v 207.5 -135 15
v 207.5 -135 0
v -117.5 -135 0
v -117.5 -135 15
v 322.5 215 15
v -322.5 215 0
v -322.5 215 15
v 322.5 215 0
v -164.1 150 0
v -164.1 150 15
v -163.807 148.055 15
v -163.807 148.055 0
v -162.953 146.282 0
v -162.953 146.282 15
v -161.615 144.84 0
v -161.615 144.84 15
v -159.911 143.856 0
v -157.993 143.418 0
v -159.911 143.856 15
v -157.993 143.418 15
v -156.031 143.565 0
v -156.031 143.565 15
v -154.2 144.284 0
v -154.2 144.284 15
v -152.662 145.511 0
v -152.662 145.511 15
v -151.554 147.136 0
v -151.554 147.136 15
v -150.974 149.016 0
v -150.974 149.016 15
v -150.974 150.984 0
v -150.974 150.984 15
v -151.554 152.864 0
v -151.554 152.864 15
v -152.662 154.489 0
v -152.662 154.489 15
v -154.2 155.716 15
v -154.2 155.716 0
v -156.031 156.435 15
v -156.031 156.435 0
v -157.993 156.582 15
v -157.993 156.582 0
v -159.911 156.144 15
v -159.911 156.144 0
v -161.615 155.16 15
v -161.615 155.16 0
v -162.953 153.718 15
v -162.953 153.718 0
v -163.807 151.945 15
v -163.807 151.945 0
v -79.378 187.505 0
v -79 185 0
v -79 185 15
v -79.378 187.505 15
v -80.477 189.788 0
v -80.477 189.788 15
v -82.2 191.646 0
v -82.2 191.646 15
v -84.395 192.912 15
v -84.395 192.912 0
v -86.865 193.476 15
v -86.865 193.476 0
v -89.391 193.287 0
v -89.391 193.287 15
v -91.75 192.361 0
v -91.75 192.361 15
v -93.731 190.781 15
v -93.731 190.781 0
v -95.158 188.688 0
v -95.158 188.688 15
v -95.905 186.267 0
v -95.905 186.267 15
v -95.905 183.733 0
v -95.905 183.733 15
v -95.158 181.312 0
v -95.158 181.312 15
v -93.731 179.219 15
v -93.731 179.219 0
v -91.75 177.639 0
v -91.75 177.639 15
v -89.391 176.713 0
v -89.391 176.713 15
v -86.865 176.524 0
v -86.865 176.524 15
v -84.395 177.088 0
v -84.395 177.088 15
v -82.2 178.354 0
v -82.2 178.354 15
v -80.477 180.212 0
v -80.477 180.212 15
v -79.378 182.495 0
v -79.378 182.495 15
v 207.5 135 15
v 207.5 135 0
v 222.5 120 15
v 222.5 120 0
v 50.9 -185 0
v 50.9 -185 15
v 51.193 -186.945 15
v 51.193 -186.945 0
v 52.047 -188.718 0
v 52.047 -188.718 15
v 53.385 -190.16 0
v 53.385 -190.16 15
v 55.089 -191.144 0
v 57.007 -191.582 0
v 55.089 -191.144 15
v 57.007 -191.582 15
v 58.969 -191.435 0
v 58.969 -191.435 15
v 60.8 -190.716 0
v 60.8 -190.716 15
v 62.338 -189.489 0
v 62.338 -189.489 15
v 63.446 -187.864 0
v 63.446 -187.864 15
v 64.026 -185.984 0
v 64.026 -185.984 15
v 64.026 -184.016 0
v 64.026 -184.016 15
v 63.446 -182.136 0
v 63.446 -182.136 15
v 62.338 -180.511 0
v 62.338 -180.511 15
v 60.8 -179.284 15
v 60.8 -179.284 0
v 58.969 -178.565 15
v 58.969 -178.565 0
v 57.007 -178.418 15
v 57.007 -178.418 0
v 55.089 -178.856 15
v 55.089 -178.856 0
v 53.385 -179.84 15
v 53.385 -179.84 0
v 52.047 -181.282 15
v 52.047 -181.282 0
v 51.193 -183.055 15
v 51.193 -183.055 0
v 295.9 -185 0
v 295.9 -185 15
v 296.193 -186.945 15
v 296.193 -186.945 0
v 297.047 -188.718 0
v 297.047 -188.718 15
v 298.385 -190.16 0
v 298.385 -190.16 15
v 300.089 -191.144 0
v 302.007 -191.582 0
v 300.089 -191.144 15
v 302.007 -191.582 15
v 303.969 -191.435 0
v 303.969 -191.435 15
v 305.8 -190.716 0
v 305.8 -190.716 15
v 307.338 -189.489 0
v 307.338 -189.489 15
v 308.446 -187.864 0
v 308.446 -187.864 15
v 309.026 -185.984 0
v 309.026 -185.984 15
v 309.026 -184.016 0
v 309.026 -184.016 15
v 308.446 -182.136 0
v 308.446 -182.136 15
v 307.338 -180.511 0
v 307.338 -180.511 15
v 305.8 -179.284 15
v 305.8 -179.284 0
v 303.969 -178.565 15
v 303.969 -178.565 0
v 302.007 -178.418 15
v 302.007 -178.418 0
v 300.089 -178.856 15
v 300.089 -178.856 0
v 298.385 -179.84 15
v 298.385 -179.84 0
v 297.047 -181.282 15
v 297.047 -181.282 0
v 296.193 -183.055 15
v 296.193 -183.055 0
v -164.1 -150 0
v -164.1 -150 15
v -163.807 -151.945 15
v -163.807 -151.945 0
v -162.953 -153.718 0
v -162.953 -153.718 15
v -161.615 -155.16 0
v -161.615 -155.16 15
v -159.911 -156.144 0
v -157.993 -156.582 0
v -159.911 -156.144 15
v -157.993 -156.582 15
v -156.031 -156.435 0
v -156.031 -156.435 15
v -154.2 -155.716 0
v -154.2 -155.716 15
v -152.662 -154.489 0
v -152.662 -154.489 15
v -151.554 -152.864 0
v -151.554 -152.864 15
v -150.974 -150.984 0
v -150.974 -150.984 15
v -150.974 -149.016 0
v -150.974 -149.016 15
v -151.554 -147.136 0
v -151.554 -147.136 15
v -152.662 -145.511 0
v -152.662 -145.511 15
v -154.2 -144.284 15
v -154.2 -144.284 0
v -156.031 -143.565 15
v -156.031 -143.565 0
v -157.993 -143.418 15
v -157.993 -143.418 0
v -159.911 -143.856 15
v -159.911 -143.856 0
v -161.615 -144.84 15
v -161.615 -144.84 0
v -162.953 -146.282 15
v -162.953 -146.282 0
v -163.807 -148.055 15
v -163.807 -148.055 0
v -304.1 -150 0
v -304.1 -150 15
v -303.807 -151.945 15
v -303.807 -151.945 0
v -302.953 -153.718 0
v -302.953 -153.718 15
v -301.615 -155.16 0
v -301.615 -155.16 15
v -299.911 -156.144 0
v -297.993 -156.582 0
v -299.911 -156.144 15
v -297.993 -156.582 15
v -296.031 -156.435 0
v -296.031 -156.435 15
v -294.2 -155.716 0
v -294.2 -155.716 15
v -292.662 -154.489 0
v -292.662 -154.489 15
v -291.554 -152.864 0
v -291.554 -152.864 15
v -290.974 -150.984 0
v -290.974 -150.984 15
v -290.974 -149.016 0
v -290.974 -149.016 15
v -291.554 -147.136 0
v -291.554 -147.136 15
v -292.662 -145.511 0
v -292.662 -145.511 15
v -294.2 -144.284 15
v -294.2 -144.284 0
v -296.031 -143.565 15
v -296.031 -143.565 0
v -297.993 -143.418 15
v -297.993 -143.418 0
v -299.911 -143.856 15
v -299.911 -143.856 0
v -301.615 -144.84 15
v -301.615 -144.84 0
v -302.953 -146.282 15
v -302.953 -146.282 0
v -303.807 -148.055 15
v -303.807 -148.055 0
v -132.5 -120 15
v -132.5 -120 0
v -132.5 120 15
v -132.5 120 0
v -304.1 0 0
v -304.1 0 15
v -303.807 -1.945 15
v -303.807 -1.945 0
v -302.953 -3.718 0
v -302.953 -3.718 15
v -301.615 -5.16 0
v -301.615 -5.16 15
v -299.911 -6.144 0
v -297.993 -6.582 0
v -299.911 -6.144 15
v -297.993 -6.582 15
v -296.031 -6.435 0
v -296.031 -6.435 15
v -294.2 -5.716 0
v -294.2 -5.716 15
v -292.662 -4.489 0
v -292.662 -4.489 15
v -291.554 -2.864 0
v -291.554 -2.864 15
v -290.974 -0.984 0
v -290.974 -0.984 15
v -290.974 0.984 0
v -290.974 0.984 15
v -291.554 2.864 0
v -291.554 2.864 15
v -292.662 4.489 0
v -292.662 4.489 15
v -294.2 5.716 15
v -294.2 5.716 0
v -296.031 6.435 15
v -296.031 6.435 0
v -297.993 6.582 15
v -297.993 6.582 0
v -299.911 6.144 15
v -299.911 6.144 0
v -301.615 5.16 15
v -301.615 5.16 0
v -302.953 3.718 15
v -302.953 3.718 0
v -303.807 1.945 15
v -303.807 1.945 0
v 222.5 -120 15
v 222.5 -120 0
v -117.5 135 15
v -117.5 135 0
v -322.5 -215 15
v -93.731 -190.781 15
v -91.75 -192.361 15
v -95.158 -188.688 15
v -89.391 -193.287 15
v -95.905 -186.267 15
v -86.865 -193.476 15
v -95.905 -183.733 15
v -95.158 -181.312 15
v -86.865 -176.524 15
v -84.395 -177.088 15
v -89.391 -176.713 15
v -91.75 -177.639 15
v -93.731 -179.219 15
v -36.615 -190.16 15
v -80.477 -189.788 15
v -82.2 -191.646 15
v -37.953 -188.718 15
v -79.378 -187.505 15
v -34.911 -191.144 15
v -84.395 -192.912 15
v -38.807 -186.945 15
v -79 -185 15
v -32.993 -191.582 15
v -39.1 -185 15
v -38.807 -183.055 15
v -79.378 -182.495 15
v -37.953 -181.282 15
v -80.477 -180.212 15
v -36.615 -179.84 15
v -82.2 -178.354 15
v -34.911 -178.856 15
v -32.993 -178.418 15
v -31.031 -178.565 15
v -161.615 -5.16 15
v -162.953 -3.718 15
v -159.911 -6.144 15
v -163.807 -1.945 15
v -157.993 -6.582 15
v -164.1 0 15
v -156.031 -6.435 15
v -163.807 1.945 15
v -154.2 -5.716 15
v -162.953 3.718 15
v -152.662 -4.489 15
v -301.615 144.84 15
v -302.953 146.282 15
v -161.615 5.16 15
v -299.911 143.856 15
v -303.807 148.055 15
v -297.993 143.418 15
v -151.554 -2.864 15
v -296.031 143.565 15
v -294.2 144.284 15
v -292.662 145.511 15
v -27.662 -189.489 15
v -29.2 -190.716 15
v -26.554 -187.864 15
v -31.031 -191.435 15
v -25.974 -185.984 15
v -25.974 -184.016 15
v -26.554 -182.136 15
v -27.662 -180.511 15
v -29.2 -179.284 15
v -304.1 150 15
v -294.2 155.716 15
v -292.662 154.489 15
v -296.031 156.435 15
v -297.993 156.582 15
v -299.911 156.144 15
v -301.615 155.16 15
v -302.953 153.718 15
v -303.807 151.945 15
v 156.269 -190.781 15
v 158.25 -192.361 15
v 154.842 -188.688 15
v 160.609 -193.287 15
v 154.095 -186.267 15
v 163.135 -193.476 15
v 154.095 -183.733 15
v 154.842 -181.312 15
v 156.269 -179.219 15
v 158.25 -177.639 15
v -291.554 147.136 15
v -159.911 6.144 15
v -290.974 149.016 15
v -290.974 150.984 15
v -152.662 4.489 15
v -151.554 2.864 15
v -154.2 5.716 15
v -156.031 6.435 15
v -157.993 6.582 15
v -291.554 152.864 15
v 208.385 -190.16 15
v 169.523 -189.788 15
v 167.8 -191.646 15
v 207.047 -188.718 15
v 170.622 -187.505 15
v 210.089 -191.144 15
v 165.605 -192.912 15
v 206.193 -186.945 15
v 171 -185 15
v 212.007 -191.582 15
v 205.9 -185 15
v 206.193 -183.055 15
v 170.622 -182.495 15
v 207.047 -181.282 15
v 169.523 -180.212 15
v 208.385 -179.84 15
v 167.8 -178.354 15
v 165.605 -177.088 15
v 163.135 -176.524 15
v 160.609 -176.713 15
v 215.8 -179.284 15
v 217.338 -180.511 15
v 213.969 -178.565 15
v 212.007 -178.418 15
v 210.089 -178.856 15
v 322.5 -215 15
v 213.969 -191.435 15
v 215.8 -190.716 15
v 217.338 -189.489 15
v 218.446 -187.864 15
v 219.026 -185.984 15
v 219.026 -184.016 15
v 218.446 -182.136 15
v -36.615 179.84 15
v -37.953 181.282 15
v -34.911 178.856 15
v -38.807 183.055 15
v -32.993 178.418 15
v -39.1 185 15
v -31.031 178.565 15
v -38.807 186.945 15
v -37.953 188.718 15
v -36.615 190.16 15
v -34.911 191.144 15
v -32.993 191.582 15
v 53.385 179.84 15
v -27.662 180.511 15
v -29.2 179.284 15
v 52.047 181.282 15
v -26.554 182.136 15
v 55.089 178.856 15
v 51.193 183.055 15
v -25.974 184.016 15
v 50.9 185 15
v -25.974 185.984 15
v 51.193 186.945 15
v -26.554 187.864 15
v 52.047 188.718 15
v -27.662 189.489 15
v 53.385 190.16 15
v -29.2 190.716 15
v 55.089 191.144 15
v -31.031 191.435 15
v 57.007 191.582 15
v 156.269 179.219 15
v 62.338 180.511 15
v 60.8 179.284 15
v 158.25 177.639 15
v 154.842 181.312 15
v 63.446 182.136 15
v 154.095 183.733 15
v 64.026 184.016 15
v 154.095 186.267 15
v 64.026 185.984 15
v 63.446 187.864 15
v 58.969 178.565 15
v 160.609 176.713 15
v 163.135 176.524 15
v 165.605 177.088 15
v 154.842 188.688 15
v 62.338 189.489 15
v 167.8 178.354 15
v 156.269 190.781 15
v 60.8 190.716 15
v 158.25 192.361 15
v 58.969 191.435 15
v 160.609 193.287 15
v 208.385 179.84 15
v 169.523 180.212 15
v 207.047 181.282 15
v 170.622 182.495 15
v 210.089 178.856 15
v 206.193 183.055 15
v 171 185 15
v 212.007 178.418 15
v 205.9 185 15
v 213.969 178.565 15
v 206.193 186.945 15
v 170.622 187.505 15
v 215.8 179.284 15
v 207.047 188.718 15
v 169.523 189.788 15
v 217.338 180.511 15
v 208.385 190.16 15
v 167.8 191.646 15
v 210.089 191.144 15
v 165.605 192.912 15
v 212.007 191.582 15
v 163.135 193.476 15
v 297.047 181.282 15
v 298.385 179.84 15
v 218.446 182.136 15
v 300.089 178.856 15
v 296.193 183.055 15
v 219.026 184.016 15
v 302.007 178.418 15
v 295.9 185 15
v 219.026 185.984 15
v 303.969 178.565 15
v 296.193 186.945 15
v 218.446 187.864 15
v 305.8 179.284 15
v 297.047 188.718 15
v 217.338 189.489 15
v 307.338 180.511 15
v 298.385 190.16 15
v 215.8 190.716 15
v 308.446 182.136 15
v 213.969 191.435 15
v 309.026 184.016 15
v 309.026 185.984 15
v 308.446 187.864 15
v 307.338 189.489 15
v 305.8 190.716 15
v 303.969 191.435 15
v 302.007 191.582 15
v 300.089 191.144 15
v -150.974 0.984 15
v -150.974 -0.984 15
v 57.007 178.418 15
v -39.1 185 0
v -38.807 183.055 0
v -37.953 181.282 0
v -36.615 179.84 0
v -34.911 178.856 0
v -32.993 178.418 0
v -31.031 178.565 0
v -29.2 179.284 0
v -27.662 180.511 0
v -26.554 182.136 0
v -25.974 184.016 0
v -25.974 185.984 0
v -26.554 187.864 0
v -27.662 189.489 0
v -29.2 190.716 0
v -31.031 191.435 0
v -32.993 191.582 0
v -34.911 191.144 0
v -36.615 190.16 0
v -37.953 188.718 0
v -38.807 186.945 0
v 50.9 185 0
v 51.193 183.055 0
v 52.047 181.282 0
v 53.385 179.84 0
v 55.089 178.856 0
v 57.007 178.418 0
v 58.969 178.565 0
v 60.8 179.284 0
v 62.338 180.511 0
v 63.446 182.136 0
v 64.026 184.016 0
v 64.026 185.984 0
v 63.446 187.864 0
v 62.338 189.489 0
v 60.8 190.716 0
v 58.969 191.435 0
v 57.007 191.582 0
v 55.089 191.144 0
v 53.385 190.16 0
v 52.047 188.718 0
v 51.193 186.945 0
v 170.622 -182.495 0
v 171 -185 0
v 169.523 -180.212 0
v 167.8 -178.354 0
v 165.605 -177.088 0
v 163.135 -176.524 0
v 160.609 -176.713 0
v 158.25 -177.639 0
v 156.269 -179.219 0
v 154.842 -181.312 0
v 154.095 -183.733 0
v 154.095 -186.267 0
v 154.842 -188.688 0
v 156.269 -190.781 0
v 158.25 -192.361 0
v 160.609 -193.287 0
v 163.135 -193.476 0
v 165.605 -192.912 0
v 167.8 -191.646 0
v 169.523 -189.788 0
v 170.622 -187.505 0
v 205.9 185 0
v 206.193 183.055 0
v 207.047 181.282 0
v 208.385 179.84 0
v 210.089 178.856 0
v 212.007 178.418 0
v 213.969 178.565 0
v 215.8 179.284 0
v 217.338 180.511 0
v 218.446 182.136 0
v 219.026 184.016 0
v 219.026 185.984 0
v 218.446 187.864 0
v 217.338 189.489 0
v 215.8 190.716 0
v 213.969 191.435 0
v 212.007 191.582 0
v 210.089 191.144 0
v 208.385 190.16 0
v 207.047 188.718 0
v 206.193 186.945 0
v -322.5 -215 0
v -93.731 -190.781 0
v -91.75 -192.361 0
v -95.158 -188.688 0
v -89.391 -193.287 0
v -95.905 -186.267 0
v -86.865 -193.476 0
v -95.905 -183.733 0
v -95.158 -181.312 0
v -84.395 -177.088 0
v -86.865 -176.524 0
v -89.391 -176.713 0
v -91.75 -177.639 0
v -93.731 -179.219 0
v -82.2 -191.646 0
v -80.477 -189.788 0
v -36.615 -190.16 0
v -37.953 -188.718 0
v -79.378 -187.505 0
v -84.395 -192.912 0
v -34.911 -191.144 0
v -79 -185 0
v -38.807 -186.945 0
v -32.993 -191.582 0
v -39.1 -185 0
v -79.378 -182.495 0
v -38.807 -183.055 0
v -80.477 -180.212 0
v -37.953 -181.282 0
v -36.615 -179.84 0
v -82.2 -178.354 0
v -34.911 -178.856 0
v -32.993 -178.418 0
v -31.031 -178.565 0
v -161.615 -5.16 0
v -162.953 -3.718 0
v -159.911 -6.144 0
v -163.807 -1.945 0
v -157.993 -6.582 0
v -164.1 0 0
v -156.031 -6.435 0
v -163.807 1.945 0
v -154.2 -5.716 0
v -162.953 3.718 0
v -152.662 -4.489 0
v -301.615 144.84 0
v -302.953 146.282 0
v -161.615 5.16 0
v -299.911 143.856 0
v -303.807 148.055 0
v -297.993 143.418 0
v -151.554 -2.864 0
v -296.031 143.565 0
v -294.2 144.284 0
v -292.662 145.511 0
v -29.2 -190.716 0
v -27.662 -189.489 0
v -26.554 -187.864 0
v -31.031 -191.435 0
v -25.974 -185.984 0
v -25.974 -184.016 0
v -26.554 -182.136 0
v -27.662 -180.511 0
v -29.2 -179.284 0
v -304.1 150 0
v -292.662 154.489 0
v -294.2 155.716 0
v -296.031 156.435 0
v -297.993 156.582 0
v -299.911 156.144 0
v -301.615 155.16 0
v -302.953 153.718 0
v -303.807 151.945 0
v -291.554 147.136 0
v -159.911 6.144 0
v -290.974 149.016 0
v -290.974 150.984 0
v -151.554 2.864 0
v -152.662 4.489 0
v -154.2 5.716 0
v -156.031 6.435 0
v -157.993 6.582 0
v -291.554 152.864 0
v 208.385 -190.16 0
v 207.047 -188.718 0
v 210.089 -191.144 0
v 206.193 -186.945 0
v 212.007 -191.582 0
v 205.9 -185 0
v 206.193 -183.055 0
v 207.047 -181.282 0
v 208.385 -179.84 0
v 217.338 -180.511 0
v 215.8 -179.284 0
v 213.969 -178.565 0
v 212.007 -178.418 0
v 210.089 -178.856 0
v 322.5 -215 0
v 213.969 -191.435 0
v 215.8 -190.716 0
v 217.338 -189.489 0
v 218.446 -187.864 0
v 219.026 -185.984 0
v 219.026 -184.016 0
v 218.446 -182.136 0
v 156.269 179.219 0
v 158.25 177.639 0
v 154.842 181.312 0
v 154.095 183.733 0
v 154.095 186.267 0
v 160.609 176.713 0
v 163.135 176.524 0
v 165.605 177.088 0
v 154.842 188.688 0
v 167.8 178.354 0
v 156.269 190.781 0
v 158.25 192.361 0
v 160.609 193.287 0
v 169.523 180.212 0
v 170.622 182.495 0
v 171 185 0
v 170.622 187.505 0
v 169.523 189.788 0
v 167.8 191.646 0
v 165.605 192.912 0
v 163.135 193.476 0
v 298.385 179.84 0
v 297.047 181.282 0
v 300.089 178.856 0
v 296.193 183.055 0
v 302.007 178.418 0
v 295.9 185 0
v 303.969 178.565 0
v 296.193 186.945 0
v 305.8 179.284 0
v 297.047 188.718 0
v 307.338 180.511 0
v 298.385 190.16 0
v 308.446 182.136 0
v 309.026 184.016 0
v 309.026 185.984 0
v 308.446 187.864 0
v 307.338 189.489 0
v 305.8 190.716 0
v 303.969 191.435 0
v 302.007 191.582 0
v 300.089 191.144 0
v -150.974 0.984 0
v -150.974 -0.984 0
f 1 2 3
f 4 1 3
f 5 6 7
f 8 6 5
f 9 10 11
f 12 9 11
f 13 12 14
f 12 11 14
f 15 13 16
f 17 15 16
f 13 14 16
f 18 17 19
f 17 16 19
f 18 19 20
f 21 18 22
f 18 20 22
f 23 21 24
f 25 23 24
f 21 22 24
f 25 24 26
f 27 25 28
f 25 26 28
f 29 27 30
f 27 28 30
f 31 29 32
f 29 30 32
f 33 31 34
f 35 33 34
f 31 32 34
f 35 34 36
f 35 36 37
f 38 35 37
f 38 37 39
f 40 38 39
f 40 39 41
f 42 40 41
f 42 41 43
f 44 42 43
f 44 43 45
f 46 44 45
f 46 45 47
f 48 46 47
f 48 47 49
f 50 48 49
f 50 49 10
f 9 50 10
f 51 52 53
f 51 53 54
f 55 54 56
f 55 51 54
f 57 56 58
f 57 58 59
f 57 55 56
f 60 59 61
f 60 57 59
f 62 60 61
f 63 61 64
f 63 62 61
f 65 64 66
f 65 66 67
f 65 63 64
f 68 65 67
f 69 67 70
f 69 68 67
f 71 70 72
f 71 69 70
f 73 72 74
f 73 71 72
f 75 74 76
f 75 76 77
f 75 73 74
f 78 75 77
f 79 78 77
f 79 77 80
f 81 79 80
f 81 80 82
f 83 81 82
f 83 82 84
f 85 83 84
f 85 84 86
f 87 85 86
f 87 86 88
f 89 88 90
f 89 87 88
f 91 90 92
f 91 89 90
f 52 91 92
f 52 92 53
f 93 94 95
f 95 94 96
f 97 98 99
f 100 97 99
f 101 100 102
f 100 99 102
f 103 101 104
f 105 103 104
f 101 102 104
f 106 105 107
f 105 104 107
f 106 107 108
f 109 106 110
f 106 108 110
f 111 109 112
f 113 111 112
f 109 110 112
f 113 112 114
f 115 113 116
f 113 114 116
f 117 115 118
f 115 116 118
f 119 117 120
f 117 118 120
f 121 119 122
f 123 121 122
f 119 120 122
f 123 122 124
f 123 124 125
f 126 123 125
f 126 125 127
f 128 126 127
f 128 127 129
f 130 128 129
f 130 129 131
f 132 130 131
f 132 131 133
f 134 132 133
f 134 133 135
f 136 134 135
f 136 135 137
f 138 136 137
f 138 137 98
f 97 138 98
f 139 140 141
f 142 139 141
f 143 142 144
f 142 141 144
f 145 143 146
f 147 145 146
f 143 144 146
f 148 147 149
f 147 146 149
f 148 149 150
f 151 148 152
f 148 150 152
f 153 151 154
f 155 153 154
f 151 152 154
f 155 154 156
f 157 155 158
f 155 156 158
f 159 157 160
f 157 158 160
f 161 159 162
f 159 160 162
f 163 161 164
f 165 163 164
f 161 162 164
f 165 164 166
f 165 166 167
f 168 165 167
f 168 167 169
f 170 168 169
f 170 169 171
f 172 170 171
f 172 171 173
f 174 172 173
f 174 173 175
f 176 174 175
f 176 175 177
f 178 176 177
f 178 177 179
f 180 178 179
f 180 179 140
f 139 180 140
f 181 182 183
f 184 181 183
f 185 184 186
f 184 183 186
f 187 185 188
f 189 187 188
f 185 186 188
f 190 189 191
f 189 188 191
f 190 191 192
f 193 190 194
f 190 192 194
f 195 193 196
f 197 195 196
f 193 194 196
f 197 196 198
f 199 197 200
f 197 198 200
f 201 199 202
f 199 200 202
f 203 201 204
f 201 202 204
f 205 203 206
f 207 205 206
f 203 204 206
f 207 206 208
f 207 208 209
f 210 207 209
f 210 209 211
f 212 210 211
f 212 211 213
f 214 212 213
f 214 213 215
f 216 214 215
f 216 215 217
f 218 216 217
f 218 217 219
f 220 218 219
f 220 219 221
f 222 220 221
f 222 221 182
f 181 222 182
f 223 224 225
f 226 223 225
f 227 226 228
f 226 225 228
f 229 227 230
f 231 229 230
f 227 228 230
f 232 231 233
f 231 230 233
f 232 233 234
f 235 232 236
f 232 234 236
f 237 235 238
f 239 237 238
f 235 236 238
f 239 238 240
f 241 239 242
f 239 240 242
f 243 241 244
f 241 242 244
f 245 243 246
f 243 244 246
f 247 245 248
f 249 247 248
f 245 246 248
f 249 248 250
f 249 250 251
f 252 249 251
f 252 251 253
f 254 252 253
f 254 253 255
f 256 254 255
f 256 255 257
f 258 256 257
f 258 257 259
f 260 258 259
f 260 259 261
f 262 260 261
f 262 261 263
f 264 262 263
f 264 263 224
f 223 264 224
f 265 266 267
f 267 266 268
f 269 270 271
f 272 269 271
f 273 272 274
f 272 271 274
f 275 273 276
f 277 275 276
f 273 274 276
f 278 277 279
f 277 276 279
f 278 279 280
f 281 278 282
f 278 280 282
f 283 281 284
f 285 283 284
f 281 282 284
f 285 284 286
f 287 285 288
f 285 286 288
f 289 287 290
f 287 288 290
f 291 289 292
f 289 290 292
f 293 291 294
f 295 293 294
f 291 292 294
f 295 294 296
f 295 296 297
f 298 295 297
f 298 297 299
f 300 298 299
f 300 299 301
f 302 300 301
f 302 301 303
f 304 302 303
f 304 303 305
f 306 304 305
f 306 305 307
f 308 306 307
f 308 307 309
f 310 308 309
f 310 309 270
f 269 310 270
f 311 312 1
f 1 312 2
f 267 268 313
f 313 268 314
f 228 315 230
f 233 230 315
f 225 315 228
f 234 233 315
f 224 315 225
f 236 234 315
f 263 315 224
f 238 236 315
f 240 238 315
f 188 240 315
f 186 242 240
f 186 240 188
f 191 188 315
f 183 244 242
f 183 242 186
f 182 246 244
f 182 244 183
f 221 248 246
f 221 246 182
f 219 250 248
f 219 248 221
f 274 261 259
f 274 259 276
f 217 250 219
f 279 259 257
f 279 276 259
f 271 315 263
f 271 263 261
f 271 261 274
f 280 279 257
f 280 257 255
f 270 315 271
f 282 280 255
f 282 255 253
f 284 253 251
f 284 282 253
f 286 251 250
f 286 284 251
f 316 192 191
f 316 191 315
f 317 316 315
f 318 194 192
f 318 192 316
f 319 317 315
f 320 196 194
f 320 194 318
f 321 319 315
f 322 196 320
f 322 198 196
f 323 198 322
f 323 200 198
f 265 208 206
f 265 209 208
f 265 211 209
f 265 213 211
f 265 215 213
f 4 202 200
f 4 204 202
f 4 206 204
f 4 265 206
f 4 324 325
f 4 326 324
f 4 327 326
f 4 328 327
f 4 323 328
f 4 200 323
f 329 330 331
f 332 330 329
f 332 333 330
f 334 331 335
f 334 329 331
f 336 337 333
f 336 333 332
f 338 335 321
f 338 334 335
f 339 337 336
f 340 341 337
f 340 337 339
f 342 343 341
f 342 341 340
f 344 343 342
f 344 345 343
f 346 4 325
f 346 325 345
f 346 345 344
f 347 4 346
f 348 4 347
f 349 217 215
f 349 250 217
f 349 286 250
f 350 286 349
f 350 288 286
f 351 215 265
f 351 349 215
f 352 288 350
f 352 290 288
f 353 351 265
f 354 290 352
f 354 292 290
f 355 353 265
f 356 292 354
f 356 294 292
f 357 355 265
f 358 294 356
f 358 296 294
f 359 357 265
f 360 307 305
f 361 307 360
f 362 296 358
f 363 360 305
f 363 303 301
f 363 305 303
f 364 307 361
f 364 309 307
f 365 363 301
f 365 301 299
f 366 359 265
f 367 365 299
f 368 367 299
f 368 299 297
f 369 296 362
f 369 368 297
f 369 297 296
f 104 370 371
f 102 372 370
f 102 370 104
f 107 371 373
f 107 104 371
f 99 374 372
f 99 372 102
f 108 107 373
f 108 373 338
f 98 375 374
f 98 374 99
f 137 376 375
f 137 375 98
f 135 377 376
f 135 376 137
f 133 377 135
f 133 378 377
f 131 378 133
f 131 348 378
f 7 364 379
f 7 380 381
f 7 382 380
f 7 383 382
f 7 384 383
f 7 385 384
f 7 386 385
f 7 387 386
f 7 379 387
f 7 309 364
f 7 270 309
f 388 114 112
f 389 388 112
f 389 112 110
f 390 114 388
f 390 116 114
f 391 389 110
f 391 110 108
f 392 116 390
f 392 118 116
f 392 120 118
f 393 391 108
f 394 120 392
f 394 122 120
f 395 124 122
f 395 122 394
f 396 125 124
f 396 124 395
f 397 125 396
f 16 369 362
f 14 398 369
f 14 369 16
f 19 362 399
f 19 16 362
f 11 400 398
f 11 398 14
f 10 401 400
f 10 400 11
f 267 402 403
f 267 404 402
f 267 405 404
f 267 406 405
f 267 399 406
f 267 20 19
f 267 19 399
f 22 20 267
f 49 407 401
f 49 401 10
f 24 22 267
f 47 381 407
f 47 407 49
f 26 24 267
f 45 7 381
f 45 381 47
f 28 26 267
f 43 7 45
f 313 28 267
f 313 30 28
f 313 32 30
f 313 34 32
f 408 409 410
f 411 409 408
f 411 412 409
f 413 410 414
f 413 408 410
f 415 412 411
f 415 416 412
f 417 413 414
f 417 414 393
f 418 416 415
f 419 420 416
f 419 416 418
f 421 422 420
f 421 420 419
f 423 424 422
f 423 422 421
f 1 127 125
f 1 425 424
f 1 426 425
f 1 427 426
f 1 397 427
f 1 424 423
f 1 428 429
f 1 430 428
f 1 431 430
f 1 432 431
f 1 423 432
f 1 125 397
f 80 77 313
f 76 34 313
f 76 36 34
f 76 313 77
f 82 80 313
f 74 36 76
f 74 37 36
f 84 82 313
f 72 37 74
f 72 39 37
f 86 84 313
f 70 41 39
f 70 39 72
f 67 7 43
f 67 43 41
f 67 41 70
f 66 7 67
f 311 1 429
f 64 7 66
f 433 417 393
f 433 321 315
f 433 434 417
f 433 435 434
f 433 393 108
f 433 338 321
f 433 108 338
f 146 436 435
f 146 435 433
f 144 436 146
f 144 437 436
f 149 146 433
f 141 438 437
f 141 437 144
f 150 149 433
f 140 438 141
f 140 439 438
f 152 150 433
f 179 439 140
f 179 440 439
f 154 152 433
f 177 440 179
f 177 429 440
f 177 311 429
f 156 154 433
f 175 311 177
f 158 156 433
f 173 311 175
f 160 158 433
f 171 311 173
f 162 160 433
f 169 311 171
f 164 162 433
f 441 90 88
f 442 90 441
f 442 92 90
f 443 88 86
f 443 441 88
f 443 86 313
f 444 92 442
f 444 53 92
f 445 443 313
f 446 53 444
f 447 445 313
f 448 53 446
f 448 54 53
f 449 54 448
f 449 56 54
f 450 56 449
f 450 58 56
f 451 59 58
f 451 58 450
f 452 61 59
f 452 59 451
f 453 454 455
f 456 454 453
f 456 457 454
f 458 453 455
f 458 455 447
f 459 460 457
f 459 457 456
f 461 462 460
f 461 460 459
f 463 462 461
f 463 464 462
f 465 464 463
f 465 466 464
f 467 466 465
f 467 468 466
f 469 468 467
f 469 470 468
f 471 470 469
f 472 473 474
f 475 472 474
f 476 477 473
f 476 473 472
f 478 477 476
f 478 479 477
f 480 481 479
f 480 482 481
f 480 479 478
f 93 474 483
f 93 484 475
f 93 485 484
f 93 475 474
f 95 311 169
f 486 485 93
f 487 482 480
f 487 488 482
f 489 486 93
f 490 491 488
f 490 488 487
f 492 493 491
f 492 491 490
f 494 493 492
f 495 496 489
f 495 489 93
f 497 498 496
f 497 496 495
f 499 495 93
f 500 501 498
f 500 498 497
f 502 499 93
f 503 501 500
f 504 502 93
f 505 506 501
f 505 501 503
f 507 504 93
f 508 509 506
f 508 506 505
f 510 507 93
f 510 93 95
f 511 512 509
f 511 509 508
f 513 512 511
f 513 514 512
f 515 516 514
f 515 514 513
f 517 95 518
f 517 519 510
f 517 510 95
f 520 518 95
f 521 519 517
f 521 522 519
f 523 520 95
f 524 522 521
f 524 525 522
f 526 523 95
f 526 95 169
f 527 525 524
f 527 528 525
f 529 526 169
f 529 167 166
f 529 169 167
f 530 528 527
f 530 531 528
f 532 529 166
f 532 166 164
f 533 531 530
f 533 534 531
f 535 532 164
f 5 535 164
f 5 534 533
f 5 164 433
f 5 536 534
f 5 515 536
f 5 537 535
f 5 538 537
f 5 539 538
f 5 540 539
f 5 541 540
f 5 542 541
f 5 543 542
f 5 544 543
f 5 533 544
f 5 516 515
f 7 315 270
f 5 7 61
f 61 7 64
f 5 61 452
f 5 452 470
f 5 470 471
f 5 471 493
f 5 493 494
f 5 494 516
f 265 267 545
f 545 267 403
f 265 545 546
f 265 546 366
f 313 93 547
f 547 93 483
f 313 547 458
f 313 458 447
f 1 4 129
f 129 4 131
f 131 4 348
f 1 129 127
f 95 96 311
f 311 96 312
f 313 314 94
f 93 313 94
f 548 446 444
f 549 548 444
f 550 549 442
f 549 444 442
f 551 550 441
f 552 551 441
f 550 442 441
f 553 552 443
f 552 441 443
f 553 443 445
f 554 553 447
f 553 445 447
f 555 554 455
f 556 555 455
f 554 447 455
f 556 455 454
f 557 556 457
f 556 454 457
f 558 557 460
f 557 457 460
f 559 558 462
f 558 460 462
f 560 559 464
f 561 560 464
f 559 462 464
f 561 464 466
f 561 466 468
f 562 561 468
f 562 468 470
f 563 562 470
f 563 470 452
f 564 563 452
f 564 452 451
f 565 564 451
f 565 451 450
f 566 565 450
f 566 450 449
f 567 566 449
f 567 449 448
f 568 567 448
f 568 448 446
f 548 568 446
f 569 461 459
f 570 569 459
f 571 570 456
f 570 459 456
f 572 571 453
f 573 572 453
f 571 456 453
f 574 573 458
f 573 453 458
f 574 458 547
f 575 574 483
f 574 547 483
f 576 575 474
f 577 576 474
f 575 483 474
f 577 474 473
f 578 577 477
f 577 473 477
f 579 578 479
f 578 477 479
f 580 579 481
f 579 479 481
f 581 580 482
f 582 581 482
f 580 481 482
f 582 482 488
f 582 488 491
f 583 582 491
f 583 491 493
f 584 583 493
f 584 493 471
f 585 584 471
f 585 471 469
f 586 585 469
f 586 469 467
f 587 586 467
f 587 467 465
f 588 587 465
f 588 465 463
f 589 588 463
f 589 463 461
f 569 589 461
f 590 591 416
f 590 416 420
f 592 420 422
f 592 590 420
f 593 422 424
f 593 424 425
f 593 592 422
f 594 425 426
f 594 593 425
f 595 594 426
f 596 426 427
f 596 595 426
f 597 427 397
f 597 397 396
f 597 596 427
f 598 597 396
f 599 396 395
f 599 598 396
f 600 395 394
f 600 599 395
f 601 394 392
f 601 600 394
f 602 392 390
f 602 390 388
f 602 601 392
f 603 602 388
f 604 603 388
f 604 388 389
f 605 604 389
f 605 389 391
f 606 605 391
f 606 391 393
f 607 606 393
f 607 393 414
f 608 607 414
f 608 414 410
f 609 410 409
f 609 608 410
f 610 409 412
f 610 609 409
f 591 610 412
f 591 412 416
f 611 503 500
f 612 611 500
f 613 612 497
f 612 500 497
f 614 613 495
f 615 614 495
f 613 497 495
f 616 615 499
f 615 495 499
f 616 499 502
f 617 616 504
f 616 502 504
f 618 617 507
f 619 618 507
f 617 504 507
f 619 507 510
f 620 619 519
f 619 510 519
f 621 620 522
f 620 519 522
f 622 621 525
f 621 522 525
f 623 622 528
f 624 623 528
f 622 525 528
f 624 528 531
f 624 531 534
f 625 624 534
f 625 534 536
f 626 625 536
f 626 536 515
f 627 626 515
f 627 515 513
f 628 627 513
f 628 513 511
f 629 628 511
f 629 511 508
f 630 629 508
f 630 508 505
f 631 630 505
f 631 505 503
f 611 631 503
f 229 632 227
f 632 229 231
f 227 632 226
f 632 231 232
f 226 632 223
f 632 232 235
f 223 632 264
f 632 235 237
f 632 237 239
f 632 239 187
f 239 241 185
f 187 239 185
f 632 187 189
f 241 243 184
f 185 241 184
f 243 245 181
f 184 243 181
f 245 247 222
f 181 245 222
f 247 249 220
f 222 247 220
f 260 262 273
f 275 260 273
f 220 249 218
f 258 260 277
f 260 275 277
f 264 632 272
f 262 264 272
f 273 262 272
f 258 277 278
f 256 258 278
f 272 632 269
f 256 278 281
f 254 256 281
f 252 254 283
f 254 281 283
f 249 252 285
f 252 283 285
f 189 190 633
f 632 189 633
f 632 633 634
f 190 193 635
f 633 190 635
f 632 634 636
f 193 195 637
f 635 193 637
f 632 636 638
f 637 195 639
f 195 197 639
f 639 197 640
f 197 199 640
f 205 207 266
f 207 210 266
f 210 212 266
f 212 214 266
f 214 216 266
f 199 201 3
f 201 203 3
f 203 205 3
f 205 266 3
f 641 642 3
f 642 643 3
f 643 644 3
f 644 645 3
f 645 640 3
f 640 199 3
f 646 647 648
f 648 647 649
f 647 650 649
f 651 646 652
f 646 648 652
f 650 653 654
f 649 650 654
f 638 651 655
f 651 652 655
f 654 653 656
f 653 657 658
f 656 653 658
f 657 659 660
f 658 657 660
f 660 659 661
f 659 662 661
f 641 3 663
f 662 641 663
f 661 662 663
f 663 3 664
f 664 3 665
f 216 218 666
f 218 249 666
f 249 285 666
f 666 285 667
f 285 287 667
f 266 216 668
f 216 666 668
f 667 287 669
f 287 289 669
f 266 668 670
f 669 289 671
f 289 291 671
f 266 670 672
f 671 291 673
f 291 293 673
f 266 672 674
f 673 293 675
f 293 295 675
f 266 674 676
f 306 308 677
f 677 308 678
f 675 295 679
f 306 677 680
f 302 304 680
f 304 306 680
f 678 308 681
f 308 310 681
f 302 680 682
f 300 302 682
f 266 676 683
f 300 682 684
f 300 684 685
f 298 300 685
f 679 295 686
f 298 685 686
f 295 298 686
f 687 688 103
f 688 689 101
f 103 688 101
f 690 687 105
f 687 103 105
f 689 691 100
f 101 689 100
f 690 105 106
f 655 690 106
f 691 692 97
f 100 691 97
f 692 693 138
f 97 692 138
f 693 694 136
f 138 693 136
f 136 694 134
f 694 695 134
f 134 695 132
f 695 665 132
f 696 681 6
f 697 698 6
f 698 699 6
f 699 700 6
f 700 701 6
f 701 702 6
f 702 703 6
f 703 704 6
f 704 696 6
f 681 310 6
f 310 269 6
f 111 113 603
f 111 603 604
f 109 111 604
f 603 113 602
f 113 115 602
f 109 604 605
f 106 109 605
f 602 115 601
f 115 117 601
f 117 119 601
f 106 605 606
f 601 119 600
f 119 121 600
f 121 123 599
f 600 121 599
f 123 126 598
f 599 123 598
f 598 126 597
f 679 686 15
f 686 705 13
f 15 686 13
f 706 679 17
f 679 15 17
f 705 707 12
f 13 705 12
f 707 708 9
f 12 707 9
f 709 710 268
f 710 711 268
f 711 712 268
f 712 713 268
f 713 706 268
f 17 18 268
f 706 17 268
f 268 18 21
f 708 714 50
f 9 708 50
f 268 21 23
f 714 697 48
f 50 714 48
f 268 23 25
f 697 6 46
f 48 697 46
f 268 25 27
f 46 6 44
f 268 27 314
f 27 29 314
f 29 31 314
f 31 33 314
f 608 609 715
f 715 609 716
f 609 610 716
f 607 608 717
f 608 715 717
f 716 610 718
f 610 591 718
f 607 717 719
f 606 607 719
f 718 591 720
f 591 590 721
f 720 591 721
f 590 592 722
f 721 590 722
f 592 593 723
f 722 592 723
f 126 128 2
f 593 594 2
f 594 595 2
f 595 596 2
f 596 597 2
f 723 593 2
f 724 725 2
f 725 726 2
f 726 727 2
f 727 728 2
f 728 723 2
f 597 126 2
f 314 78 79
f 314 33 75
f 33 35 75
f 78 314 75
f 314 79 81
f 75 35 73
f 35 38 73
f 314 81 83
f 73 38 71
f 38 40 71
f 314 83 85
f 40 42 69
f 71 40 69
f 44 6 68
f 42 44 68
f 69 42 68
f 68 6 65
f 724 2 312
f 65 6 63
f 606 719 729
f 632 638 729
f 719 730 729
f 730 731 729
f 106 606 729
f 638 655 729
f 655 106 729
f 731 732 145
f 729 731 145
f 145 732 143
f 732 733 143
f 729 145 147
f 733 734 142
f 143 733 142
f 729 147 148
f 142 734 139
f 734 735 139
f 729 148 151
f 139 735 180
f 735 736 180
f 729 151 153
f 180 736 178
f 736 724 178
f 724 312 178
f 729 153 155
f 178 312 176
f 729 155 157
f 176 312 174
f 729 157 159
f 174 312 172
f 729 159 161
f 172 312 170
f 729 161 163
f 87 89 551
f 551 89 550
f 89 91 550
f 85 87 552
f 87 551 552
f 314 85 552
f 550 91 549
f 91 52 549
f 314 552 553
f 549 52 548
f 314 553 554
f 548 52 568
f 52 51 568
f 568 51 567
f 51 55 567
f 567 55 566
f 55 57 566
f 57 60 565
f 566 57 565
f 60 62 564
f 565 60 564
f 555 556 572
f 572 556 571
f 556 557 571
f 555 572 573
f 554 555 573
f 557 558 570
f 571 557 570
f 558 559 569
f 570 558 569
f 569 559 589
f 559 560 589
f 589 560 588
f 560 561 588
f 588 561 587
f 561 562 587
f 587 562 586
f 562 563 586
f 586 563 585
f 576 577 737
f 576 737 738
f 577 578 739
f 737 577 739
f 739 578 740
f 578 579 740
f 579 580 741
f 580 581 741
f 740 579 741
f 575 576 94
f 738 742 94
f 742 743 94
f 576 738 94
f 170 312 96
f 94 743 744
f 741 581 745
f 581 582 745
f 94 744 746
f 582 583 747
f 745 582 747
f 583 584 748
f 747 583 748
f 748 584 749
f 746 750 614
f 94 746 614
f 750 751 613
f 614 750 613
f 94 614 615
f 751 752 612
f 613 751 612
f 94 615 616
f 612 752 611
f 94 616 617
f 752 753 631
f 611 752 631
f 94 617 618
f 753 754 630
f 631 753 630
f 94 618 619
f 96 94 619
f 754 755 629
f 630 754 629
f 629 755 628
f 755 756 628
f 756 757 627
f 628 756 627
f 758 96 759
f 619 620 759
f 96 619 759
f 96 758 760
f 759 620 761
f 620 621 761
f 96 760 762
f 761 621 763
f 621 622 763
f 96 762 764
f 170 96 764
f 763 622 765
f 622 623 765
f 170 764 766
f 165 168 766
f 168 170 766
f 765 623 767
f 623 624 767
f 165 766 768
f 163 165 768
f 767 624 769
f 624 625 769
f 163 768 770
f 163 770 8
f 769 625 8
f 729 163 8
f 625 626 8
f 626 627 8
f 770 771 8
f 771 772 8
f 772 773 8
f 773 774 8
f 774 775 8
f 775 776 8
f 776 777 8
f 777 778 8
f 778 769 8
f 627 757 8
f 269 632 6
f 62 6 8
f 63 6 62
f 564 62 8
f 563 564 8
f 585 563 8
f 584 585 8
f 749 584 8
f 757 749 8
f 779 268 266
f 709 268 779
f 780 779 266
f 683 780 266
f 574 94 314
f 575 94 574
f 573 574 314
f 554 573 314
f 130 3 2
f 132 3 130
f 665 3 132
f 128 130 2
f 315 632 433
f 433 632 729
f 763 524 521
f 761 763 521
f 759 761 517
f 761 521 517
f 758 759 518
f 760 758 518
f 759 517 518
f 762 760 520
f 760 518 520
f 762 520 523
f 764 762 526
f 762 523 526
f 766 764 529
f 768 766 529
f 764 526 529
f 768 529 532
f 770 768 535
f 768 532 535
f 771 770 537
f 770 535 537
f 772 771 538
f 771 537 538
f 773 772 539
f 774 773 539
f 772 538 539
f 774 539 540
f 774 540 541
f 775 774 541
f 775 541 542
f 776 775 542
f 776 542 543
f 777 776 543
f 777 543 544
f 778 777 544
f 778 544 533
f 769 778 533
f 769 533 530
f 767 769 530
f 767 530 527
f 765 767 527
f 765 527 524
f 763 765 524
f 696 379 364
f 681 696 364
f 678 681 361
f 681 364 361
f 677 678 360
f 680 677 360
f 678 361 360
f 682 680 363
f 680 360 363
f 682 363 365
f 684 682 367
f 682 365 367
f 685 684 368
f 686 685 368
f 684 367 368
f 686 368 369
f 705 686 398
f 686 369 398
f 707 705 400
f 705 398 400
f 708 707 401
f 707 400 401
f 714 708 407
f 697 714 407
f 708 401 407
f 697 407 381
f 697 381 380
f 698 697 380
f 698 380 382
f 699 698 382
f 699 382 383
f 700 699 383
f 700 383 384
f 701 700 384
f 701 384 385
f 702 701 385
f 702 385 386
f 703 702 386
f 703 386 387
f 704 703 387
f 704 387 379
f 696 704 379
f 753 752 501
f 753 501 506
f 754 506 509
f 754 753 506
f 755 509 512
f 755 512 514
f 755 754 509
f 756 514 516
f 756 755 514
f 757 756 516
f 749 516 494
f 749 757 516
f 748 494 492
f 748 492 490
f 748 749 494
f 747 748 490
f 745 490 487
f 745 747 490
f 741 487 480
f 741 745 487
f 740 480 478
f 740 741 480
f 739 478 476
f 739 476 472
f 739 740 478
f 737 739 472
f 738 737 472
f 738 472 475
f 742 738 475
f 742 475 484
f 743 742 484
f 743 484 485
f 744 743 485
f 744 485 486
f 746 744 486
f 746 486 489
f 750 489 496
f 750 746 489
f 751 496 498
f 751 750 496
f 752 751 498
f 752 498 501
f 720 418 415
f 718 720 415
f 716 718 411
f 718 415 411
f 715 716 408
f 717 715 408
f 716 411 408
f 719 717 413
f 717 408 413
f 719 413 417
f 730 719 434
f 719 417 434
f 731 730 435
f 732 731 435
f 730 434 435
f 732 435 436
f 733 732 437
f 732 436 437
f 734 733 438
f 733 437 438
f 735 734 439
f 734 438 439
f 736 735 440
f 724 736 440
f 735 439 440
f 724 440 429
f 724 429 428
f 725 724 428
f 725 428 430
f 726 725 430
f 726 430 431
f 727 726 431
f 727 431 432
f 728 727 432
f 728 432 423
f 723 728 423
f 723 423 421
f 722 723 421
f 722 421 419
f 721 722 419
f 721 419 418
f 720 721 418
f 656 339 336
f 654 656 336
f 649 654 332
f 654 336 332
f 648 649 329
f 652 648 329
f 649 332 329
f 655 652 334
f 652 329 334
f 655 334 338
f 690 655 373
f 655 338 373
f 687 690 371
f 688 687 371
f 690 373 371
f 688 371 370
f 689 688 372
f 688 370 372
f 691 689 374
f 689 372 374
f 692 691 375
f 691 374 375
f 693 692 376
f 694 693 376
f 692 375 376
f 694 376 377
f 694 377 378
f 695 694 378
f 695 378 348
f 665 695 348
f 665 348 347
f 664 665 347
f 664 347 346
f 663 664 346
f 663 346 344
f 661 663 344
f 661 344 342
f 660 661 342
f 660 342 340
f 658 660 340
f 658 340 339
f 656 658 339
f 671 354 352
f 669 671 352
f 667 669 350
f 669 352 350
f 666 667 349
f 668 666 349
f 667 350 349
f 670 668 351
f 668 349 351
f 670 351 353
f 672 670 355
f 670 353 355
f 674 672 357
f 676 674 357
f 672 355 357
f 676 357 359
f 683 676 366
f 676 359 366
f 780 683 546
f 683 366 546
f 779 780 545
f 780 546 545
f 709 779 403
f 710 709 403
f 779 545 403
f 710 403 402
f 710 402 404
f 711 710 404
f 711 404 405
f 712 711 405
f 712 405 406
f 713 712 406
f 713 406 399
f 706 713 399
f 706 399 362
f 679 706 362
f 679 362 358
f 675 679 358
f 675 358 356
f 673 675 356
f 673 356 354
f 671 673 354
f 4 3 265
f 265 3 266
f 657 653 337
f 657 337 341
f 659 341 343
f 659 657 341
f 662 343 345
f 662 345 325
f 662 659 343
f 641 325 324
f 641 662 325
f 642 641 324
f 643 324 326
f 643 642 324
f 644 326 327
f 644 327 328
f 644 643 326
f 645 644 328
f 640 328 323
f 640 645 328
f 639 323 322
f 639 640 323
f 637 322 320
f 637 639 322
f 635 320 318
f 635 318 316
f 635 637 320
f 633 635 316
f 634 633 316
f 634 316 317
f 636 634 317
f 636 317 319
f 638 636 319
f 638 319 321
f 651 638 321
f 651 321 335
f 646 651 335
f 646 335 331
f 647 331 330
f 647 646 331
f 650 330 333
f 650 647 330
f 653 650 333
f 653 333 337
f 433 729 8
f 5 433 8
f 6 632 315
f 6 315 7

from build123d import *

# Parameters (mm, degrees)
F0_W     = 645
F0_H     = 430
F1_DEPTH = 15
F3_D     = 13.2
F4_R     = 8.5
F5_DEPTH = 15


with BuildPart() as f1:
    # F0 (on Top) → F1 (new body)
    with BuildSketch(Plane.XY):
        Rectangle(F0_W, F0_H)
        Polygon((-132.5, 120), (-117.5, 135), (207.5, 135), (222.5, 120), (222.5, -120), (207.5, -135), (-117.5, -135), (-132.5, -120), align=None, mode=Mode.SUBTRACT)
    extrude(amount=F1_DEPTH)

    # F3 (through all)
    with Locations(Plane(origin=(0, 0, 0), x_dir=(1, 0, 0), z_dir=(0, 0, -1))):
        with Locations((-297.5, -150), (-297.5, 0), (-297.5, 150), (-157.5, -150), (-157.5, 0), (-157.5, 150), (-32.5, 185), (57.5, 185), (212.5, 185), (302.5, 185), (302.5, -185), (212.5, -185), (57.5, -185), (-32.5, -185)):
            Hole(F3_D / 2)

    # F4 (on Top) → F5 (cut, through all)
    with BuildSketch(Plane.XY):
        with Locations((-87.5, 185)):
            Circle(F4_R)
        with Locations((162.5, 185)):
            Circle(F4_R)
        with Locations((162.5, -185)):
            Circle(F4_R)
        with Locations((-87.5, -185)):
            Circle(F4_R)
    extrude(amount=F5_DEPTH, mode=Mode.SUBTRACT)


solid = f1.part
